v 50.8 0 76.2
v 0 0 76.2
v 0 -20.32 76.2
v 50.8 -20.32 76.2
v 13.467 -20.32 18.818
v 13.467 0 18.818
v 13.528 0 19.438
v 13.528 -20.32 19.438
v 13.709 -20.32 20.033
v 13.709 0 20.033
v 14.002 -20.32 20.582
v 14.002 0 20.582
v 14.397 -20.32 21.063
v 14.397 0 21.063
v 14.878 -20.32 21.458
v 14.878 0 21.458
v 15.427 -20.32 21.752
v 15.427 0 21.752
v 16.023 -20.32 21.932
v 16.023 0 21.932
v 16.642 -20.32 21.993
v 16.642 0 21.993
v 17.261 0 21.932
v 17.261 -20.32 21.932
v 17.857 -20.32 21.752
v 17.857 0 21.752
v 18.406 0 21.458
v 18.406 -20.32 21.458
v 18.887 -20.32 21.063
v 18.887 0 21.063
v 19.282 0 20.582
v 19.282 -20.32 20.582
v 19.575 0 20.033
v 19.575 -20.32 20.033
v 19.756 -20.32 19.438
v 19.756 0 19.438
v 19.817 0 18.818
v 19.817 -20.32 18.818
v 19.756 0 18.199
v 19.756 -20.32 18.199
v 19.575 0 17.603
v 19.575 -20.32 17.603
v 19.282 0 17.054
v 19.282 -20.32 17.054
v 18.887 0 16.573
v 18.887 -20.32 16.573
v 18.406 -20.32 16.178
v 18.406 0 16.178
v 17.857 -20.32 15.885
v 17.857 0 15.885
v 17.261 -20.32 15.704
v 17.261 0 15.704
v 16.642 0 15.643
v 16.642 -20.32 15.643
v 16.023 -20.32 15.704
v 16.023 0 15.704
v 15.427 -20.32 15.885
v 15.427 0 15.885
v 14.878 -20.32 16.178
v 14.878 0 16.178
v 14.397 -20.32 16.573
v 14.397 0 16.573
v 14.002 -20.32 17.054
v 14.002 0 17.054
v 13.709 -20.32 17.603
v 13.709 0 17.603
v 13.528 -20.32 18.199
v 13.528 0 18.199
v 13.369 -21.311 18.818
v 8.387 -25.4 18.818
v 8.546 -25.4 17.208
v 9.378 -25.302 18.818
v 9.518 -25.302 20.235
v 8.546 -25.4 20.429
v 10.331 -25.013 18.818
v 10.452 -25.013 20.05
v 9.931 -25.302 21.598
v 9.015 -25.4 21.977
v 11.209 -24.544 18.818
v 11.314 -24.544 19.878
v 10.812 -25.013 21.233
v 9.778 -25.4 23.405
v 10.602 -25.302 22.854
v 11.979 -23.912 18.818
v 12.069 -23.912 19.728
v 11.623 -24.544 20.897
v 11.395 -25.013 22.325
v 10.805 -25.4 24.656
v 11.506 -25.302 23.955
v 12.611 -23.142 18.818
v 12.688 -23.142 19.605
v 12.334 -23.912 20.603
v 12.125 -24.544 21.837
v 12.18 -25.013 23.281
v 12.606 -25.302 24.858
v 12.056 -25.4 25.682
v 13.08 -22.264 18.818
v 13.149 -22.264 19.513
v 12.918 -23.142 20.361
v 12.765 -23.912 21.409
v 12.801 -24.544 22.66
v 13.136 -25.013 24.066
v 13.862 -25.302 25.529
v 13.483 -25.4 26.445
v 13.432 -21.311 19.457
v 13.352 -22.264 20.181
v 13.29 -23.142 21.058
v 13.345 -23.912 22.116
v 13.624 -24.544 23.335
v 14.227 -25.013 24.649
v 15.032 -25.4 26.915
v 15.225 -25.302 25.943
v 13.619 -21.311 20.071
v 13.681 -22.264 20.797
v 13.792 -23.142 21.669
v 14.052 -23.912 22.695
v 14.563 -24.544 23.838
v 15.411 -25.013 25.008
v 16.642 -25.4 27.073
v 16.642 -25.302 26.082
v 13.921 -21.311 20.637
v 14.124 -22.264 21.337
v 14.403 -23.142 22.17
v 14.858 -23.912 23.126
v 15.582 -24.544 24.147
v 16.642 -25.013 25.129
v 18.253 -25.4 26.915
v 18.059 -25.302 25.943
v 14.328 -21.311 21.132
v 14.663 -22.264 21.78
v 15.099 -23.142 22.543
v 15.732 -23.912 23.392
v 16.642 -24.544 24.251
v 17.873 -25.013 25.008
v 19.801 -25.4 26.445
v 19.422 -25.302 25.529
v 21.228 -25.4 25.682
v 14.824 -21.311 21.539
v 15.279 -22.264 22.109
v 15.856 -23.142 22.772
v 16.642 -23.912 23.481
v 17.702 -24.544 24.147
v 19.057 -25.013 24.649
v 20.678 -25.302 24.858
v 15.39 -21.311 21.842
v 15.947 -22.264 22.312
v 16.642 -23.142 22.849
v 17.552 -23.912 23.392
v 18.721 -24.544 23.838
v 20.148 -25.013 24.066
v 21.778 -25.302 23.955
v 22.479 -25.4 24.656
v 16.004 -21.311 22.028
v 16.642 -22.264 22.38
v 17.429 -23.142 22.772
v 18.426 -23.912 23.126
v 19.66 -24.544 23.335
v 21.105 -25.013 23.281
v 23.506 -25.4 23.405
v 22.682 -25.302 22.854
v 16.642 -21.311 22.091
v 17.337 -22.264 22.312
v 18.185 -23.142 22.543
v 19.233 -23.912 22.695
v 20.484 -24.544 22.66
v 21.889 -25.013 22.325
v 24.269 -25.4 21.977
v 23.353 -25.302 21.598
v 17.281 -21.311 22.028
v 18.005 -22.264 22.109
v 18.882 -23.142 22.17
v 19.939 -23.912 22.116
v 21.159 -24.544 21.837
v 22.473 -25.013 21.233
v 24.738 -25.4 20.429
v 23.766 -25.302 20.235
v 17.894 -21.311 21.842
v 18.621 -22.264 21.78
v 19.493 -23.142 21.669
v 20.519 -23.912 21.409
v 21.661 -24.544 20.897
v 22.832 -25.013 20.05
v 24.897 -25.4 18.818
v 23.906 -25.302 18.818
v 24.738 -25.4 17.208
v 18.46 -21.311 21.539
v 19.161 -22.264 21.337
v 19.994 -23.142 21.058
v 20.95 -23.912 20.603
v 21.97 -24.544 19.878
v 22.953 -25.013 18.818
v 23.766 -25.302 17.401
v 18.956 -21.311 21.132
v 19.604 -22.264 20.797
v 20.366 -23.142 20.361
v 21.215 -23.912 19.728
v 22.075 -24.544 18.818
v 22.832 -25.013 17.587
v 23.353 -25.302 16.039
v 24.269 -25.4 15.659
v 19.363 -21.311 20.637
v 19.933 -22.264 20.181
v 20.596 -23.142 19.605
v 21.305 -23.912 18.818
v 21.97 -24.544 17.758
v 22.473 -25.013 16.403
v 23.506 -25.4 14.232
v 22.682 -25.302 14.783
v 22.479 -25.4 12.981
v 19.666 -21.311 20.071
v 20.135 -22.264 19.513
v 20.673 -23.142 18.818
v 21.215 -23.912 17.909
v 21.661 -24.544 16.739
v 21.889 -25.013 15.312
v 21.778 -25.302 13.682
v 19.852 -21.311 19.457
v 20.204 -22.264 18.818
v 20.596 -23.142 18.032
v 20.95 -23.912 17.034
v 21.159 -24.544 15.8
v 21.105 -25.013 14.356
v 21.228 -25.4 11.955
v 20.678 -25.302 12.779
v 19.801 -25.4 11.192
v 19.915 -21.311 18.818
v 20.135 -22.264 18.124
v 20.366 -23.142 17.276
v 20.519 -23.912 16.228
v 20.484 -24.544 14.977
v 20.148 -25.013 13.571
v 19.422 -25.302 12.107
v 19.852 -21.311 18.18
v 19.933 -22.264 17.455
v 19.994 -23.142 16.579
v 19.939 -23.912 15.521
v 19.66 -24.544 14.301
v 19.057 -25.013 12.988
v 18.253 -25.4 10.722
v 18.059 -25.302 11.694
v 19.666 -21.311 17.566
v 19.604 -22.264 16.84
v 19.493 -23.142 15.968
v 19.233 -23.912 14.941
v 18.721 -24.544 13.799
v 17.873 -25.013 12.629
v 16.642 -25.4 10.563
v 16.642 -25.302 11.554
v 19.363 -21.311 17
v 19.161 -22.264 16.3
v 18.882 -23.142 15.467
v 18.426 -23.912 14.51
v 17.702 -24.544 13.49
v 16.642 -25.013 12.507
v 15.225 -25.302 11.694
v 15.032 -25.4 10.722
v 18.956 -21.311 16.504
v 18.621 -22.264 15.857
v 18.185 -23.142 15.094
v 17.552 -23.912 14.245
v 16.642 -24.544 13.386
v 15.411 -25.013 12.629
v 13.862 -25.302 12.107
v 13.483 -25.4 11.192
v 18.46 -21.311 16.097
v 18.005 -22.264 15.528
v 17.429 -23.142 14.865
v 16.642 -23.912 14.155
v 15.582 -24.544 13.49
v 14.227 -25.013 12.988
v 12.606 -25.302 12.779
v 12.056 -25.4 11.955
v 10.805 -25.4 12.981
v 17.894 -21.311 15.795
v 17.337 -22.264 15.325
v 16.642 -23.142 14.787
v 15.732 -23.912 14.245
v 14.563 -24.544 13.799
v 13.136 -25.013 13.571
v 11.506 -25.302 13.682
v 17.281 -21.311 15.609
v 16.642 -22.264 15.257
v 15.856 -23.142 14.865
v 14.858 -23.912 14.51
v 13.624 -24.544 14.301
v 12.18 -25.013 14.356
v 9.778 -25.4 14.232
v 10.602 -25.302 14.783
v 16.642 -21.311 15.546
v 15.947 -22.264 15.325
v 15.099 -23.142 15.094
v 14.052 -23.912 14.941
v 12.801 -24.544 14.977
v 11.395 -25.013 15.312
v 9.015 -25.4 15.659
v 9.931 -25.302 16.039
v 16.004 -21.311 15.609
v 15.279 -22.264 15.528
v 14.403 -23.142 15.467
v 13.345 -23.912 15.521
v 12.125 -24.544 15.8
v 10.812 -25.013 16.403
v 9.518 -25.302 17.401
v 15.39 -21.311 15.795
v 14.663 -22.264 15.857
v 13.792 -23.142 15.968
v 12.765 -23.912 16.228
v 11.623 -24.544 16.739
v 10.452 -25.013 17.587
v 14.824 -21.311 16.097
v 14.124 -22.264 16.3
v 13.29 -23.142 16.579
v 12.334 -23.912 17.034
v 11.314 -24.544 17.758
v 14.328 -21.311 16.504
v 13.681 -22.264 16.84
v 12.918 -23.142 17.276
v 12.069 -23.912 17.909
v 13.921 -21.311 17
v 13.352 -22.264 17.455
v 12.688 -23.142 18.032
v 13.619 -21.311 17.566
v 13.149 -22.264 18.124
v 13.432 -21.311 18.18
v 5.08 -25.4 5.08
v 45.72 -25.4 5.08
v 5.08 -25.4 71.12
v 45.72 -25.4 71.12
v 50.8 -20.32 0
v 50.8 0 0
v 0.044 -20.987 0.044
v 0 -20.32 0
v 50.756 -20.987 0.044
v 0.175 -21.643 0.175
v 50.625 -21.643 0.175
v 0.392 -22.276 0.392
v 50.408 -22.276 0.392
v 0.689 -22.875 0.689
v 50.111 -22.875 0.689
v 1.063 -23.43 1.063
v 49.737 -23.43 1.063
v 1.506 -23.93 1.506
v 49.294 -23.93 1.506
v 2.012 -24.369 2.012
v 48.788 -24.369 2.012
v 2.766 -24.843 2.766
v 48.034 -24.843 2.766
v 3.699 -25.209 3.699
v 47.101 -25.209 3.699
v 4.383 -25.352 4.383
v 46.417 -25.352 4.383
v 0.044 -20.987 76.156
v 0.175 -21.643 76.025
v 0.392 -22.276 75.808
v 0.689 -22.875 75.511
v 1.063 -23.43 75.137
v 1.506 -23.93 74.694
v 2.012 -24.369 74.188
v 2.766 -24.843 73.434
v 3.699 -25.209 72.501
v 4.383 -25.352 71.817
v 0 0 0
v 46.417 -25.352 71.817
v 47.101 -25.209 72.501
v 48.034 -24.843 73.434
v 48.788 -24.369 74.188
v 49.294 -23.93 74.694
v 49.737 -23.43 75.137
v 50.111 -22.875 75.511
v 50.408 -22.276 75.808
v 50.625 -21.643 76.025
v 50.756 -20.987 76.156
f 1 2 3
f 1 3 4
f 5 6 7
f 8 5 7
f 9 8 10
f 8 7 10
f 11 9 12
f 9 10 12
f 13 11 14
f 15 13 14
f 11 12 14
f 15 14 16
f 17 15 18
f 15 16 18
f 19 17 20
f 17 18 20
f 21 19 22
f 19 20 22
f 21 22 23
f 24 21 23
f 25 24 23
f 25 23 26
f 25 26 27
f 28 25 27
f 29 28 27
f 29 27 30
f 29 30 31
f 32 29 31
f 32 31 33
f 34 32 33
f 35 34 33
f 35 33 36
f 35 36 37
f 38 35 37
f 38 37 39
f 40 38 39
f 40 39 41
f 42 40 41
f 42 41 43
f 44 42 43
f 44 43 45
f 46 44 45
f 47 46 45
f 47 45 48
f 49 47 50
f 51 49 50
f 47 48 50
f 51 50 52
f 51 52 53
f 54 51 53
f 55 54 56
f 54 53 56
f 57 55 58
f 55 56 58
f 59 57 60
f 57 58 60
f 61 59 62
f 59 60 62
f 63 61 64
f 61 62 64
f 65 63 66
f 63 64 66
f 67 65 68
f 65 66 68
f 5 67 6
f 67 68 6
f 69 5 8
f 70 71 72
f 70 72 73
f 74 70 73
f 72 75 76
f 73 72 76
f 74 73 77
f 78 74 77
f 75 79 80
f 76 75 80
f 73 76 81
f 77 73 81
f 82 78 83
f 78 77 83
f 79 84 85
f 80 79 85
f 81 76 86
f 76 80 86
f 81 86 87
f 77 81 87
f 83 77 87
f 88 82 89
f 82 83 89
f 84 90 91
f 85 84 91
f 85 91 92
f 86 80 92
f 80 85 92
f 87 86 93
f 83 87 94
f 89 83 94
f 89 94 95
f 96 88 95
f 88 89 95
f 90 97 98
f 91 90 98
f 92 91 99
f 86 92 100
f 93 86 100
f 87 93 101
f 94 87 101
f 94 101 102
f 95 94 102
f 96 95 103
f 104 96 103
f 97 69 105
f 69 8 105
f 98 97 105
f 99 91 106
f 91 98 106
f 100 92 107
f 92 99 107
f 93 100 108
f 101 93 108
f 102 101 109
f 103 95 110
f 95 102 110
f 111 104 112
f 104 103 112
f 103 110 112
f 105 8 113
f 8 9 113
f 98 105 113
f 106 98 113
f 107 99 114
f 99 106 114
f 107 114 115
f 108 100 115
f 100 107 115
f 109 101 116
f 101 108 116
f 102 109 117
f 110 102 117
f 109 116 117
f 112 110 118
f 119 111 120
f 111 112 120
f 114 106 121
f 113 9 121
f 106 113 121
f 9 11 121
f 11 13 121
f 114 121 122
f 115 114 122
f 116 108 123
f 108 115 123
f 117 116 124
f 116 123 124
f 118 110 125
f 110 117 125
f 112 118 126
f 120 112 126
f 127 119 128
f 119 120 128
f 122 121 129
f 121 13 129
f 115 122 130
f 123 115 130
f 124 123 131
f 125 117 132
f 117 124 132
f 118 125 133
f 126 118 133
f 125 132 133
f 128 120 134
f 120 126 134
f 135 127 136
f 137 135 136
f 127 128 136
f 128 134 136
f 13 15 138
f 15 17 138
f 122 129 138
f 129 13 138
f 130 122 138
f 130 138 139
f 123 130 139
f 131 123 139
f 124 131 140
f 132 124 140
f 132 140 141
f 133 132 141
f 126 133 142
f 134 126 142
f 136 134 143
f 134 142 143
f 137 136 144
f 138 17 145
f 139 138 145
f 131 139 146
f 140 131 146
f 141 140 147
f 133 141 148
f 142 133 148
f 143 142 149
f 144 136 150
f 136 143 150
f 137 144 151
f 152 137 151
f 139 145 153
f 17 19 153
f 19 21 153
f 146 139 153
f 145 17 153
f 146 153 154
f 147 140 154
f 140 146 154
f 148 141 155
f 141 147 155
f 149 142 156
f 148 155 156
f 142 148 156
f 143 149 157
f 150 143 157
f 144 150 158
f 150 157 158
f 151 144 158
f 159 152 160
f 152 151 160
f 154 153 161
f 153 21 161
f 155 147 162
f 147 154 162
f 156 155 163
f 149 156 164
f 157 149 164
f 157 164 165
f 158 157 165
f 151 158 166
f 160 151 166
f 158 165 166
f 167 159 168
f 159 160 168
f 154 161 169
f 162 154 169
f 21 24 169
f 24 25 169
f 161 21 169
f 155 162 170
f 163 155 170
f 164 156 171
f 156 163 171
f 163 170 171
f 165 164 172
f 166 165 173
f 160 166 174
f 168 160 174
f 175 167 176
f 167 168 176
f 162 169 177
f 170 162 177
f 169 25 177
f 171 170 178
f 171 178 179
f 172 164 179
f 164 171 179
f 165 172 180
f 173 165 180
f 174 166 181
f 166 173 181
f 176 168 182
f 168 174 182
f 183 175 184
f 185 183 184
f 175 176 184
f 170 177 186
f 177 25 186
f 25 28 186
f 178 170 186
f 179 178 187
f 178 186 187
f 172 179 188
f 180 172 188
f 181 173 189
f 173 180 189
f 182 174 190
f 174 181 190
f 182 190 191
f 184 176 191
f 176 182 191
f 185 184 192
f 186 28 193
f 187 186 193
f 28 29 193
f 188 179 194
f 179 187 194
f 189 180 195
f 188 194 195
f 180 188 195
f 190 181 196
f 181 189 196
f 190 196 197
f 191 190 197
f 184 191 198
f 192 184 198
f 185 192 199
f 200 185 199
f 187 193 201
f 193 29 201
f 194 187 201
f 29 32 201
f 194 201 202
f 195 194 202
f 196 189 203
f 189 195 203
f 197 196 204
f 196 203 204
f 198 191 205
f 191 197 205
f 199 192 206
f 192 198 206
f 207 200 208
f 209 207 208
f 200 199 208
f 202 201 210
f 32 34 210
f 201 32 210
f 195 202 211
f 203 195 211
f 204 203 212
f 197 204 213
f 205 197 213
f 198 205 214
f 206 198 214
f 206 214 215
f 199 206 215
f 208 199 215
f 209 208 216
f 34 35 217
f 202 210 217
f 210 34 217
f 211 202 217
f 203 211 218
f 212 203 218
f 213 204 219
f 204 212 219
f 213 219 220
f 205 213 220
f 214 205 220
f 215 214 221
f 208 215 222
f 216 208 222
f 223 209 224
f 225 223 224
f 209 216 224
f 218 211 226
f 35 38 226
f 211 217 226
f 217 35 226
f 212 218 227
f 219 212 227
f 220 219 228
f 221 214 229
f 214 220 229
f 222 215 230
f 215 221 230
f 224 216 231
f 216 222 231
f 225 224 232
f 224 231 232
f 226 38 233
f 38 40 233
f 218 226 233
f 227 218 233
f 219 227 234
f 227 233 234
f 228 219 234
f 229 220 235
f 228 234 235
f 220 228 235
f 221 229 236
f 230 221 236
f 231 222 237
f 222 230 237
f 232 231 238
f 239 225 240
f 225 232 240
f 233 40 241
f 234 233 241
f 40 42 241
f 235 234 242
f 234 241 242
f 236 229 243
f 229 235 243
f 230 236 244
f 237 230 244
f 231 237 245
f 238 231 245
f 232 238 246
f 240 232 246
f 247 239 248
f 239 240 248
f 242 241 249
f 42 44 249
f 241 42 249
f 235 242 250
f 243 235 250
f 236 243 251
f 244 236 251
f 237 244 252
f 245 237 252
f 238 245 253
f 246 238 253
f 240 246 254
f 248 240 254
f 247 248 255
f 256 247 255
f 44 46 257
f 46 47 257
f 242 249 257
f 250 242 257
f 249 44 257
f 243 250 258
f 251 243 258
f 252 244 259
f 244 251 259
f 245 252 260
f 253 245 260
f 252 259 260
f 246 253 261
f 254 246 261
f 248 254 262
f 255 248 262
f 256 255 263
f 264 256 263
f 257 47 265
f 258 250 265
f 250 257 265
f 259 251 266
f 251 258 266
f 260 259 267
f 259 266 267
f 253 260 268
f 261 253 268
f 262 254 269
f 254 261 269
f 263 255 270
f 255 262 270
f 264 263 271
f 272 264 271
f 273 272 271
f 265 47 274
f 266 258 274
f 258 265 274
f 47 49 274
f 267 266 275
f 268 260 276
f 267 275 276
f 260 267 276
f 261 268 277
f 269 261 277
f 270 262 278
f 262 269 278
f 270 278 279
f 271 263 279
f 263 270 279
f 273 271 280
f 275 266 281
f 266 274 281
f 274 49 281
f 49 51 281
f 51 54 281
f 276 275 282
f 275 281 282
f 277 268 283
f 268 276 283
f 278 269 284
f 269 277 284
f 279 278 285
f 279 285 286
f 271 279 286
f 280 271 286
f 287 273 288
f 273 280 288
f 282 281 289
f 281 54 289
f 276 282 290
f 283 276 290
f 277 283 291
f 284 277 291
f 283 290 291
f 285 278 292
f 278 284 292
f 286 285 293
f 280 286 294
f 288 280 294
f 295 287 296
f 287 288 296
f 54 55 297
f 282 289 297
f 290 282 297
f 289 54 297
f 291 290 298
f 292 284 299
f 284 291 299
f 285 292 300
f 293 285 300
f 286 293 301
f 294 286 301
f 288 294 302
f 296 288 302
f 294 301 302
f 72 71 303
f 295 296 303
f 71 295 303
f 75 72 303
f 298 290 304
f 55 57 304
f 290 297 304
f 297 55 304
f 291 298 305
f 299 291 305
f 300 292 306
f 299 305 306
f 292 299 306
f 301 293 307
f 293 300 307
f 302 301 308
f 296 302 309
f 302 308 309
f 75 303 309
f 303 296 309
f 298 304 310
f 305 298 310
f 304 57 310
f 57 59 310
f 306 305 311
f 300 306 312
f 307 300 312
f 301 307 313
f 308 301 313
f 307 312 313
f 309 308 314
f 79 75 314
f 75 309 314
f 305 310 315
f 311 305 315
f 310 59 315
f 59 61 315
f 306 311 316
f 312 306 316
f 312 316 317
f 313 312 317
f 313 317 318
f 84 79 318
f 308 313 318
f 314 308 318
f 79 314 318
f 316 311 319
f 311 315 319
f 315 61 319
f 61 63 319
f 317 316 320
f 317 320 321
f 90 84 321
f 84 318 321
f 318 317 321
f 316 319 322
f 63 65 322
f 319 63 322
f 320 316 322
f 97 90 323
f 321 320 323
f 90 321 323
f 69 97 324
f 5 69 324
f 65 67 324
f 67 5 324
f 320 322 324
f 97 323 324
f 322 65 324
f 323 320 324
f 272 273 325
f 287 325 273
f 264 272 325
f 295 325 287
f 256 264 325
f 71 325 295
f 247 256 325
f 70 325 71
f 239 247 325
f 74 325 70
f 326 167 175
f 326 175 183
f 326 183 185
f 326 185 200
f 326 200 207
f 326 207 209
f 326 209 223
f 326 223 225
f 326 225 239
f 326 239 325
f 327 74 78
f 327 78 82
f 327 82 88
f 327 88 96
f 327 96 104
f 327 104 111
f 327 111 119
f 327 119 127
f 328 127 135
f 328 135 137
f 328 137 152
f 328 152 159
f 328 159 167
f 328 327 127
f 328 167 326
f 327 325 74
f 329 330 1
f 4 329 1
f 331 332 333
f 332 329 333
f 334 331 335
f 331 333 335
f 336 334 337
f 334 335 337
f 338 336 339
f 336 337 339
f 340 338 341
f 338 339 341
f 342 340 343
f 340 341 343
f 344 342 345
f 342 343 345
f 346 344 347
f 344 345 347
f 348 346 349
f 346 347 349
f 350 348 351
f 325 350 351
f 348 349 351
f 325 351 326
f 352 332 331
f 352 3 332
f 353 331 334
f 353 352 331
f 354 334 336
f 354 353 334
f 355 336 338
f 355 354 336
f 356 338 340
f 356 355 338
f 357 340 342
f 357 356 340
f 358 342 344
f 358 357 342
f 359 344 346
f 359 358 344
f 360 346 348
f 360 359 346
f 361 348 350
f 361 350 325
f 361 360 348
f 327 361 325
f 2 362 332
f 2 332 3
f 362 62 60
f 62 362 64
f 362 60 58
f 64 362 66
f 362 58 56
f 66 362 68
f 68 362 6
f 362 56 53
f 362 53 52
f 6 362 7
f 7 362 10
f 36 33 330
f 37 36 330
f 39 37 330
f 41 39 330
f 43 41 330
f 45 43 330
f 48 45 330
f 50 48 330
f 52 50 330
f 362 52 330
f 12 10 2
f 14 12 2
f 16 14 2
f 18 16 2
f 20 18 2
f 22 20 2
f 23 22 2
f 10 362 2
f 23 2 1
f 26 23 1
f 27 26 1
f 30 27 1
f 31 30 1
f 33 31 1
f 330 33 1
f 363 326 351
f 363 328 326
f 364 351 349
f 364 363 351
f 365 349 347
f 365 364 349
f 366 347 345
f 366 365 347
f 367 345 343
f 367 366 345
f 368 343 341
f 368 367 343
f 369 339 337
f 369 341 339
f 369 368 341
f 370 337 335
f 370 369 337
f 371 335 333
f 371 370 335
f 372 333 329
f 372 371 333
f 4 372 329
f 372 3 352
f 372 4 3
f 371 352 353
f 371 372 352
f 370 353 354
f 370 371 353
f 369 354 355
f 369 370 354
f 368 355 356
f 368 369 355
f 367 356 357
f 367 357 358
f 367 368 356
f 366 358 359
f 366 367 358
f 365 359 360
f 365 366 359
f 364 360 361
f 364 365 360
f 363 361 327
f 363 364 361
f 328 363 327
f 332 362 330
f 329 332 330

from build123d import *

# Parameters (mm, degrees)
F0_W     = 50.8
F0_H     = 76.2
F1_DEPTH = 25.4
F3_D     = 6.35
F4_R     = 5.08


with BuildPart() as f1:
    # F0 (on Front) → F1 (new body)
    with BuildSketch(Plane.XZ):
        with Locations((25.4, 38.1)):
            Rectangle(F0_W, F0_H)
    extrude(amount=F1_DEPTH)

    # F3 (through all)
    with Locations(Plane.XZ.offset(25.4)):
        with Locations((16.642079, 18.818352)):
            Hole(F3_D / 2)

    # F4
    f4_edges = [f1.edges().sort_by_distance(p)[0] for p in [
        (0, -25.4, 38.1),
        (25.4, -25.4, 76.2),
        (25.4, -25.4, 0),
        (50.8, -25.4, 38.1),
        (13.467079, -25.4, 18.818352),
    ]]
    fillet(f4_edges, radius=F4_R)


solid = f1.part
